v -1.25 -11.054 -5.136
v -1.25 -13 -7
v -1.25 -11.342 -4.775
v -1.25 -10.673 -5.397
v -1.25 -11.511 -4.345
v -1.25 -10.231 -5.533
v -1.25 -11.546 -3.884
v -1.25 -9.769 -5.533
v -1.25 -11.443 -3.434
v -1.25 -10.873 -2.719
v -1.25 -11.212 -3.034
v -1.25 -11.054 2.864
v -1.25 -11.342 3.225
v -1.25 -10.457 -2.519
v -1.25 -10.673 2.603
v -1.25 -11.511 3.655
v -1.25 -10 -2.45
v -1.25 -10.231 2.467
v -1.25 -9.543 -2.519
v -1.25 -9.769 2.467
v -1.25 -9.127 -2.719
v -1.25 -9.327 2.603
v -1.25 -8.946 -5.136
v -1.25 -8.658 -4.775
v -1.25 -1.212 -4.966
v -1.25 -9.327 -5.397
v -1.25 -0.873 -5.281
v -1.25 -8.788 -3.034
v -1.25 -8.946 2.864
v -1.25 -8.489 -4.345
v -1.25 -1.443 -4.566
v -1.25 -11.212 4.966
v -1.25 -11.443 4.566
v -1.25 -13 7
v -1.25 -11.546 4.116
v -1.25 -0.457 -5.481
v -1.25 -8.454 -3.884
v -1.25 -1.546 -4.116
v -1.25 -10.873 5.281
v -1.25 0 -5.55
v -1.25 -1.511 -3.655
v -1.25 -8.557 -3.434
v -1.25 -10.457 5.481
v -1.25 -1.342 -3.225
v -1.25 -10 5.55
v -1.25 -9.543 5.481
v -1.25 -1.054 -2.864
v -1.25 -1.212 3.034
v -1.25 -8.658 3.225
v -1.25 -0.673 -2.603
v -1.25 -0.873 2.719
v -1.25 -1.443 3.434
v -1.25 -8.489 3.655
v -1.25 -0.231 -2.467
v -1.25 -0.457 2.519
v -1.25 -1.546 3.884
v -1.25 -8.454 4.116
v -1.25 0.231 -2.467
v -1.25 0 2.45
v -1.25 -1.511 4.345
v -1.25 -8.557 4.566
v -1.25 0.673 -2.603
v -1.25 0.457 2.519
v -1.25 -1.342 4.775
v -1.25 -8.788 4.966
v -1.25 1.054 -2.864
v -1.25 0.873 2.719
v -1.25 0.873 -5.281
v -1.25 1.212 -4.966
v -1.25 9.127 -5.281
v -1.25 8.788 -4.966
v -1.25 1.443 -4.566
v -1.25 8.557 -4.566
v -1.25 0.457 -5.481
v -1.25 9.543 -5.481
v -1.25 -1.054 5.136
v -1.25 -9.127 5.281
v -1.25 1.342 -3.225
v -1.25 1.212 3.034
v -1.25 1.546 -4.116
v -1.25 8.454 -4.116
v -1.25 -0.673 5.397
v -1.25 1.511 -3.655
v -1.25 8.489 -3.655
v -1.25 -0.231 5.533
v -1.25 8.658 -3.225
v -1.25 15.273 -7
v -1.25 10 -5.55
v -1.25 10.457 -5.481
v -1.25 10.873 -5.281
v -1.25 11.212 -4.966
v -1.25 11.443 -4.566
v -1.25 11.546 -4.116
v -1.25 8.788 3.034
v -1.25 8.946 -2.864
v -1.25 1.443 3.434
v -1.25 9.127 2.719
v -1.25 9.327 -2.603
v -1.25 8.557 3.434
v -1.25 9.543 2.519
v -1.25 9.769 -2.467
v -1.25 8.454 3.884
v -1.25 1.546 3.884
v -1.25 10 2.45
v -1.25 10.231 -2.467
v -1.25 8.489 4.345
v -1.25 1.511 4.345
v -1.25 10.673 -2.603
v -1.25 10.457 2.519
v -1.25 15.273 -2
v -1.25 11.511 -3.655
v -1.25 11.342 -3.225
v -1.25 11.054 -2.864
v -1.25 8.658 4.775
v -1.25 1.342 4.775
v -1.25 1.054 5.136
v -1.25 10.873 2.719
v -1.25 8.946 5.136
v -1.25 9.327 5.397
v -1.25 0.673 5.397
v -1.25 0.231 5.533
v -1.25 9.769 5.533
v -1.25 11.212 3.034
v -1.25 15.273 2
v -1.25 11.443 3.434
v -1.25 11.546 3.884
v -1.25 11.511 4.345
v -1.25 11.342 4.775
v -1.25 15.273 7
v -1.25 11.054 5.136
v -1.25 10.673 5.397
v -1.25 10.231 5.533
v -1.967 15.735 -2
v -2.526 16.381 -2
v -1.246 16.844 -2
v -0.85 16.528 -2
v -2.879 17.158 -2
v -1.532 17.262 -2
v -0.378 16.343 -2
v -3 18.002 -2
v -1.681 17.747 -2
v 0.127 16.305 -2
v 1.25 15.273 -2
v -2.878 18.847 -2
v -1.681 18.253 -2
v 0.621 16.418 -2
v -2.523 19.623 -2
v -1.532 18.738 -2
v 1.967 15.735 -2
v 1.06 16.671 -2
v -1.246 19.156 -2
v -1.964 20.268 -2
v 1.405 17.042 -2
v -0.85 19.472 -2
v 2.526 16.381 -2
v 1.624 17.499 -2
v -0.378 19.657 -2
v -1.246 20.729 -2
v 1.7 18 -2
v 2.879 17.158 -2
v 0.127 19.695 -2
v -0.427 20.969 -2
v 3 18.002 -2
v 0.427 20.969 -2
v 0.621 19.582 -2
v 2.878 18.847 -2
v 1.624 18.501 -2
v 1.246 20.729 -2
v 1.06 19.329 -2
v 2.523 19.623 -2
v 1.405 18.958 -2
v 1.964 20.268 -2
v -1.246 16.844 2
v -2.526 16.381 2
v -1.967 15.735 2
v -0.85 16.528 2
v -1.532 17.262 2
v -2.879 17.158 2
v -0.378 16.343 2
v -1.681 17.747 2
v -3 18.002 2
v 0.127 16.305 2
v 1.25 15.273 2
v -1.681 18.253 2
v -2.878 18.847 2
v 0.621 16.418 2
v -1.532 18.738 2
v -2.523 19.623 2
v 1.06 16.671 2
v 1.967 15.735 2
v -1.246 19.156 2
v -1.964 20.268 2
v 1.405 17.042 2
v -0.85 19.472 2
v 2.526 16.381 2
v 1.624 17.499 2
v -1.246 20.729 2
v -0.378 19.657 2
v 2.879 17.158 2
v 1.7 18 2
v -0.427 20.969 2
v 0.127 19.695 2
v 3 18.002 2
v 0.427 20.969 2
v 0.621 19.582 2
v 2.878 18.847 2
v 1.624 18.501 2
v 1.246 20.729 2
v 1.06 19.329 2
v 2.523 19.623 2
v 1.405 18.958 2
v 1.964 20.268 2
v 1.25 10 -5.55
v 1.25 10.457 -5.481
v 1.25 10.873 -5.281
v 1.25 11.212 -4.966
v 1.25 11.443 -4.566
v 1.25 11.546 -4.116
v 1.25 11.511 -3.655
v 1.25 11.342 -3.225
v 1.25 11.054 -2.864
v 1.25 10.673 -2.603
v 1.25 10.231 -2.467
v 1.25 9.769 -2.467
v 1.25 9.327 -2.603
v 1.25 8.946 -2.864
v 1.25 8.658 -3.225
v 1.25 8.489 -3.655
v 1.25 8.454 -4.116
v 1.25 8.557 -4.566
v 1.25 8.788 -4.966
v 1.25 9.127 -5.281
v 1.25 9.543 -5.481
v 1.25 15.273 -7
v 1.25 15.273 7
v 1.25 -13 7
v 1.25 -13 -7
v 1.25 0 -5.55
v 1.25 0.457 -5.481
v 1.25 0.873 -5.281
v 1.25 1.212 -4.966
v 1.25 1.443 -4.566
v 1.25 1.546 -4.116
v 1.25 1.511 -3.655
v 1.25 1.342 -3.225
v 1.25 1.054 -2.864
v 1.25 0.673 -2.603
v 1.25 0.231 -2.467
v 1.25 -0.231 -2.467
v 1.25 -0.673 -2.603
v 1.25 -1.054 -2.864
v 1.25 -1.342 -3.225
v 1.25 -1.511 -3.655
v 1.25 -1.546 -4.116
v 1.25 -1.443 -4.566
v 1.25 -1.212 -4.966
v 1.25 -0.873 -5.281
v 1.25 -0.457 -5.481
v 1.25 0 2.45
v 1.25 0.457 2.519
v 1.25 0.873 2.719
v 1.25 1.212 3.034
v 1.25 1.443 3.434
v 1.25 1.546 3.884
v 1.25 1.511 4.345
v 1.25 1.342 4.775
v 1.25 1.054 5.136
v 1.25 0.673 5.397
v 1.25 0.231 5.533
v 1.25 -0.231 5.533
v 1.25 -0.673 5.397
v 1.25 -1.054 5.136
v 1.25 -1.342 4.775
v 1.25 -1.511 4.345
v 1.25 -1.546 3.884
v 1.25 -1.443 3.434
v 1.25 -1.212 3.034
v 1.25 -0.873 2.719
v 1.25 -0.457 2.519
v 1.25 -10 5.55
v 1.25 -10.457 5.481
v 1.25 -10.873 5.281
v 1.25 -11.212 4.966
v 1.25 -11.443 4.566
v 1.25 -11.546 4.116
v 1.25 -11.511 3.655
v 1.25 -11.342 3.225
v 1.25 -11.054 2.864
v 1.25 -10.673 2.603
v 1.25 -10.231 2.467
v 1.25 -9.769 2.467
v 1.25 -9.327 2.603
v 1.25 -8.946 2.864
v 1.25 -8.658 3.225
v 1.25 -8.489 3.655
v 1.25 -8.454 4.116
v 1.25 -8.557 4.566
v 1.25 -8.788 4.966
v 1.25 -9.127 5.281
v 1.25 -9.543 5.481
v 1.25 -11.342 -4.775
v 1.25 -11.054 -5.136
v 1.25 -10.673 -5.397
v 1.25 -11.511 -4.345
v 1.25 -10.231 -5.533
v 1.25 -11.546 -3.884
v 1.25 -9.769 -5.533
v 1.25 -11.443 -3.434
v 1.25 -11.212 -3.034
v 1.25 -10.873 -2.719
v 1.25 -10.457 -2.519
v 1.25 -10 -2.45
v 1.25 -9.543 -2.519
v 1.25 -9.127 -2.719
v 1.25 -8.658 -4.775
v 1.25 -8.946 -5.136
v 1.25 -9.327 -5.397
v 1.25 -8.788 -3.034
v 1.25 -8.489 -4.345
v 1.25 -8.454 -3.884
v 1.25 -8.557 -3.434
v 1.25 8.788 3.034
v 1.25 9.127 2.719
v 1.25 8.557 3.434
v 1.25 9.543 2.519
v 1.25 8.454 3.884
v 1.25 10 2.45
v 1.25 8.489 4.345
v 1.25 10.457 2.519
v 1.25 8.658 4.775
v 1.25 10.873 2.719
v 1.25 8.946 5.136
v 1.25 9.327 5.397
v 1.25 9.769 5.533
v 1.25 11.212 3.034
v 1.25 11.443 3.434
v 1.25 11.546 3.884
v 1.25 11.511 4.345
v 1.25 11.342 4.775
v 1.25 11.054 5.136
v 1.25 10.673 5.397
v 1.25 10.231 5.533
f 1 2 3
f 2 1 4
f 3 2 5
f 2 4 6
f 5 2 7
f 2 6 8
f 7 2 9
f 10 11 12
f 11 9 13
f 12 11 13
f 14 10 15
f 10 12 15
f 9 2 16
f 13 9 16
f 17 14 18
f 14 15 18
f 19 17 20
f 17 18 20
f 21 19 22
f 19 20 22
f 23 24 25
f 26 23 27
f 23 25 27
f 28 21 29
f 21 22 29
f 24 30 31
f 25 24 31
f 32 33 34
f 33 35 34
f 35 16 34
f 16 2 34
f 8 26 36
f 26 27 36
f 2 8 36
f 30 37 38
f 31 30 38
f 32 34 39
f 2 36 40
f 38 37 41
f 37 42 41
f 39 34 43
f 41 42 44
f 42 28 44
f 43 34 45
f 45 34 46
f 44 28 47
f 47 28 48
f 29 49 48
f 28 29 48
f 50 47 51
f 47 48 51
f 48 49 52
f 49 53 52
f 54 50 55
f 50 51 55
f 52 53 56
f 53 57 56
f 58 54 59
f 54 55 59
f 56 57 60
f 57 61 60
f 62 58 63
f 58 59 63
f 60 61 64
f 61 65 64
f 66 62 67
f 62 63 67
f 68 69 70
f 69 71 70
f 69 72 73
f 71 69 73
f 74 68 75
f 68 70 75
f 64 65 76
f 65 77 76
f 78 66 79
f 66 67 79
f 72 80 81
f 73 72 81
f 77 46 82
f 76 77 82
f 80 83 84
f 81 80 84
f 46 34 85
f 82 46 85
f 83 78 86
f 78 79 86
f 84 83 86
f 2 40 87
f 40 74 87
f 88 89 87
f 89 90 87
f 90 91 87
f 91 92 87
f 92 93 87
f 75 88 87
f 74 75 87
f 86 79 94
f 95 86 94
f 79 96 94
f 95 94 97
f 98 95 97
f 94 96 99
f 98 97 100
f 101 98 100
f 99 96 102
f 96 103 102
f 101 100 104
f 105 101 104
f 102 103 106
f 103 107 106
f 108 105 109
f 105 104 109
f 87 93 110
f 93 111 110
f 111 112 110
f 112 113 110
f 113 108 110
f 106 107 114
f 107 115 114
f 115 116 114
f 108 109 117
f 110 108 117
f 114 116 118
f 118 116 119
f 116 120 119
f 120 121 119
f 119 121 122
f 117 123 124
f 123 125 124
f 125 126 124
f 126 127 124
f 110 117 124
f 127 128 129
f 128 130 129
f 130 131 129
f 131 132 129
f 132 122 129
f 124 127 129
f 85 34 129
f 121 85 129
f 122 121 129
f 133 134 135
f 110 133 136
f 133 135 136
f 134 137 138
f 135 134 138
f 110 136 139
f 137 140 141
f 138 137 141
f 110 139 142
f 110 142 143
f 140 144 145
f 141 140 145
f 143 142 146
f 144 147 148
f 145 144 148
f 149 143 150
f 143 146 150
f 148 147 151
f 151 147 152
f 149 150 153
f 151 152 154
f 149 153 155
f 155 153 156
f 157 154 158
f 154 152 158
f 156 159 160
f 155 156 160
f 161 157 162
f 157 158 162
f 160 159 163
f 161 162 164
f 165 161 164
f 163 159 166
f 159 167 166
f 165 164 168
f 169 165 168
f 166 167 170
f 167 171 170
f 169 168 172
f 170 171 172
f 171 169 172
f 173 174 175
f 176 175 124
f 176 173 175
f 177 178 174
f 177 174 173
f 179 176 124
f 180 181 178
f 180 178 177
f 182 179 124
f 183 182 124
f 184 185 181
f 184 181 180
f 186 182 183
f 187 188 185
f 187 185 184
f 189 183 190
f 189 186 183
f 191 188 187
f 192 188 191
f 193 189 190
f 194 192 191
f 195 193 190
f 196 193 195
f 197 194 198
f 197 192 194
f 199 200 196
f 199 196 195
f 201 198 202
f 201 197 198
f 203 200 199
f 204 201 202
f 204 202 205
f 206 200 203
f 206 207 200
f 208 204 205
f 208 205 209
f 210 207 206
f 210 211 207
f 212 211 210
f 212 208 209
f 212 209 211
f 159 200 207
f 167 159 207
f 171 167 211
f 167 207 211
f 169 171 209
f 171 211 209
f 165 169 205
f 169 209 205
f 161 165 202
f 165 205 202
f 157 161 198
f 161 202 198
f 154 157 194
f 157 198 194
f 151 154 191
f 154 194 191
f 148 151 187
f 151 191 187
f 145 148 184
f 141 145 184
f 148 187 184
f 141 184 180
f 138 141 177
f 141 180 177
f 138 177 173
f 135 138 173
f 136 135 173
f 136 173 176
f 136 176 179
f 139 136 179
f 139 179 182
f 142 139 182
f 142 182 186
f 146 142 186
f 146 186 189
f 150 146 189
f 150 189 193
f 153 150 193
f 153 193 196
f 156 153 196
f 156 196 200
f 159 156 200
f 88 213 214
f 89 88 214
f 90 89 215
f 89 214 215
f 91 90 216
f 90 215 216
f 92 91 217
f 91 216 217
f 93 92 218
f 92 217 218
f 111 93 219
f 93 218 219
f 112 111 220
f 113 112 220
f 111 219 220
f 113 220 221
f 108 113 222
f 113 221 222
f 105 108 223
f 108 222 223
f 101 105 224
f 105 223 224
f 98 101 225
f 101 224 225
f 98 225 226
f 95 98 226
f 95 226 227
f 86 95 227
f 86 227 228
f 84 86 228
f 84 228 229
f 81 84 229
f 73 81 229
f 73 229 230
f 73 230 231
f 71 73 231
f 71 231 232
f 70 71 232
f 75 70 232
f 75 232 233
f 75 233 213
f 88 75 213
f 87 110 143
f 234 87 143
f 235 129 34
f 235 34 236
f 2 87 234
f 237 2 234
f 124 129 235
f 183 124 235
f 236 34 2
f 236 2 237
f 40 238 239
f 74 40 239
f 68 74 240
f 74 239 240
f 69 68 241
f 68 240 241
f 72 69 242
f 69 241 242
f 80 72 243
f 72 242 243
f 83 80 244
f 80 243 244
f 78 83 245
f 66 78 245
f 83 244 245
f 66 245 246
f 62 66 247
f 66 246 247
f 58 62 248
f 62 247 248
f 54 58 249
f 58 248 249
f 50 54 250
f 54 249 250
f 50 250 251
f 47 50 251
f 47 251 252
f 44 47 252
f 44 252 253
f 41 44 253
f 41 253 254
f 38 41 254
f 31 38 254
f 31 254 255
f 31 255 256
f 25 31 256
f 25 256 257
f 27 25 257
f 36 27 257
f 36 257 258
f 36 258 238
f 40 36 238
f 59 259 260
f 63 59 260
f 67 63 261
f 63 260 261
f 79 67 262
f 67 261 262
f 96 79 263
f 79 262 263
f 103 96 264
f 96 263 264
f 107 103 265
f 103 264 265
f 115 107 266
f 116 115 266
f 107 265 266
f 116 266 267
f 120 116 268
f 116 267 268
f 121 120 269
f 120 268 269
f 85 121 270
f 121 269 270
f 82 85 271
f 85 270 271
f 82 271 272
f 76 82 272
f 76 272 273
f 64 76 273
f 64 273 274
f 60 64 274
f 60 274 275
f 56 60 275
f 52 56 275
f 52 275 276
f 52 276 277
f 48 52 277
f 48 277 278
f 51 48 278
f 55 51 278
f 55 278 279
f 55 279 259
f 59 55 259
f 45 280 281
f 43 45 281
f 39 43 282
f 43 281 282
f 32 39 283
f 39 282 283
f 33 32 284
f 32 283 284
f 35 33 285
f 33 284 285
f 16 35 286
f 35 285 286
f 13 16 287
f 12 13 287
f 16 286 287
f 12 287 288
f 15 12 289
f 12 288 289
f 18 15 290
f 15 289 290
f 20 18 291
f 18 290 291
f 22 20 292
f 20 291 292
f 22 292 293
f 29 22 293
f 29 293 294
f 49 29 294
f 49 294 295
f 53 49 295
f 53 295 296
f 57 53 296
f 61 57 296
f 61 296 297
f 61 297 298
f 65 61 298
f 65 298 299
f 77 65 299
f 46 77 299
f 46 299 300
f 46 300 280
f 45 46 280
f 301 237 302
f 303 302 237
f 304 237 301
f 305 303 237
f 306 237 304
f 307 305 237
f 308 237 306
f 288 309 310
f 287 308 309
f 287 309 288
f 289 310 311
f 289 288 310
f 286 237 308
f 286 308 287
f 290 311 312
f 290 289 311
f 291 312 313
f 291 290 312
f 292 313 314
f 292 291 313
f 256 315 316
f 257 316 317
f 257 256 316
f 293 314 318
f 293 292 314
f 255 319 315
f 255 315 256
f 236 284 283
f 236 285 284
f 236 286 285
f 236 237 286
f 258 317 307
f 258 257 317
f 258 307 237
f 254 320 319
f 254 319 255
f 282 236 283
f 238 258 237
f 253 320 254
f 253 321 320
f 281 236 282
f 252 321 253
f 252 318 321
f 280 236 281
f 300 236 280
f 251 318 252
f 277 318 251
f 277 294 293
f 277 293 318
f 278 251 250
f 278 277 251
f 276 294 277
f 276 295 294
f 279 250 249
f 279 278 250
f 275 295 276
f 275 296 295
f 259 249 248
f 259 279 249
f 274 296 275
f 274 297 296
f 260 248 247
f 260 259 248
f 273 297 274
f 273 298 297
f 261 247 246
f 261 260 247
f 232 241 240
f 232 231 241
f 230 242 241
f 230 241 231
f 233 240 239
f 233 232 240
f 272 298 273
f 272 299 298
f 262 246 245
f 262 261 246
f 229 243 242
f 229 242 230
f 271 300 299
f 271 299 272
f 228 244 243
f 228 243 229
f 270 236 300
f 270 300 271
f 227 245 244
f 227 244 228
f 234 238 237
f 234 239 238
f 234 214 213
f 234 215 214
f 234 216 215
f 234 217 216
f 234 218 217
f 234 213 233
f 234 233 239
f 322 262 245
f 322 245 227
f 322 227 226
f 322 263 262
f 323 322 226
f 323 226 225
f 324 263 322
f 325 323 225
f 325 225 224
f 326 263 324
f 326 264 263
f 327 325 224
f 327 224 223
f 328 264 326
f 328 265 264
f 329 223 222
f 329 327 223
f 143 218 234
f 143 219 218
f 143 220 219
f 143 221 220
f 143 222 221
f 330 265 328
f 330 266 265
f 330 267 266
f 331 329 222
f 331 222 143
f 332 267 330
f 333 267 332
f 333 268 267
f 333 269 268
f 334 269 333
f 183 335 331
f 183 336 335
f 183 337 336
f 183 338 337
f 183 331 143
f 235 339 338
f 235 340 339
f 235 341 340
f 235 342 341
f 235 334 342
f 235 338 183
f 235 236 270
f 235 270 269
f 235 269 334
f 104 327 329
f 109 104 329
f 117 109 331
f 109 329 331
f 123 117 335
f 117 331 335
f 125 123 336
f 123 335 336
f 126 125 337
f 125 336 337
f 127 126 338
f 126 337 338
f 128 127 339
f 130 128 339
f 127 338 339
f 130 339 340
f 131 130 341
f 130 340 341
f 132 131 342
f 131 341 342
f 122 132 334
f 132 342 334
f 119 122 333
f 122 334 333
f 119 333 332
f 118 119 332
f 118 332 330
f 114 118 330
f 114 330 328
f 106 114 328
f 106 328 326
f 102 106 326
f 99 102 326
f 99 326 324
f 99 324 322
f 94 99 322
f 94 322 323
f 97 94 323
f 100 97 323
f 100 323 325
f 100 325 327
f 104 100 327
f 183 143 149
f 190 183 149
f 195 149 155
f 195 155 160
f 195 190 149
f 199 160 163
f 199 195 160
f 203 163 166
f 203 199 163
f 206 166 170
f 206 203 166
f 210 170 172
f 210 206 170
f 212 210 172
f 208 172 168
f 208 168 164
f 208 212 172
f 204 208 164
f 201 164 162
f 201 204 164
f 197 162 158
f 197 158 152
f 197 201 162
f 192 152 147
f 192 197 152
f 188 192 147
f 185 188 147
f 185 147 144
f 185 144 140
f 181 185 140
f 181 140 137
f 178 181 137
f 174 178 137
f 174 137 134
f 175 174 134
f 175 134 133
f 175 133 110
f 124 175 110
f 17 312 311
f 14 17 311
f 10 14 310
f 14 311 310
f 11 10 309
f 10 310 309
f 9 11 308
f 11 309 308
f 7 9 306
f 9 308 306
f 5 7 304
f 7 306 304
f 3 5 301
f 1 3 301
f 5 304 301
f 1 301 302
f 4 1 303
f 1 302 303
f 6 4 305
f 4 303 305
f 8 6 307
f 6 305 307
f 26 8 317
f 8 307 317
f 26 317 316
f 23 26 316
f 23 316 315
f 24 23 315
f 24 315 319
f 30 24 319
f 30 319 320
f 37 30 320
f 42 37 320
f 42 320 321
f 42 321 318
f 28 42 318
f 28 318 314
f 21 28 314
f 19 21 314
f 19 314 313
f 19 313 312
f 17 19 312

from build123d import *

# Parameters (mm, degrees)
SKETCH2_W           = 2.5
SKETCH2_H           = 28.272821971
BOSS_EXTRUDE5_DEPTH = 7
SKETCH2_8_R         = 3
BOSS_EXTRUDE6_DEPTH = 2
SKETCH3_R           = 1.7
CUT_EXTRUDE1_DEPTH  = 24.043437244
SKETCH4_R           = 1.55
CUT_EXTRUDE2_DEPTH  = 23.540241791


with BuildPart() as part:
    # Sketch2 → Boss-Extrude5 (new, symmetric)
    with BuildSketch(Plane.XY):
        with Locations((0, 1.136410986)):
            Rectangle(SKETCH2_W, SKETCH2_H)
    extrude(amount=BOSS_EXTRUDE5_DEPTH, both=True)

    # Sketch2<8> → Boss-Extrude6 (add, symmetric)
    with BuildSketch(Plane.XY):
        with Locations((0, 18)):
            Circle(SKETCH2_8_R)
    extrude(amount=BOSS_EXTRUDE6_DEPTH, both=True)

    # Sketch3 → Cut-Extrude1 (cut, through all)
    with BuildSketch(Plane.XY.offset(2)):
        with Locations((0, 18)):
            Circle(SKETCH3_R)
    extrude(amount=-CUT_EXTRUDE1_DEPTH, mode=Mode.SUBTRACT)

    # Sketch4 → Cut-Extrude2 (cut, through all)
    with BuildSketch(Plane(origin=(1.25, 0, 0), x_dir=(0, 0, -1), z_dir=(1, 0, 0))):
        with Locations((4, 0)):
            Circle(SKETCH4_R)
        with Locations((-4, 0)):
            Circle(SKETCH4_R)
        with Locations((-4, 10)):
            Circle(SKETCH4_R)
        with Locations((4, 10)):
            Circle(SKETCH4_R)
        with Locations((4, -10)):
            Circle(SKETCH4_R)
        with Locations((-4, -10)):
            Circle(SKETCH4_R)
    extrude(amount=-CUT_EXTRUDE2_DEPTH, mode=Mode.SUBTRACT)


solid = part.part
